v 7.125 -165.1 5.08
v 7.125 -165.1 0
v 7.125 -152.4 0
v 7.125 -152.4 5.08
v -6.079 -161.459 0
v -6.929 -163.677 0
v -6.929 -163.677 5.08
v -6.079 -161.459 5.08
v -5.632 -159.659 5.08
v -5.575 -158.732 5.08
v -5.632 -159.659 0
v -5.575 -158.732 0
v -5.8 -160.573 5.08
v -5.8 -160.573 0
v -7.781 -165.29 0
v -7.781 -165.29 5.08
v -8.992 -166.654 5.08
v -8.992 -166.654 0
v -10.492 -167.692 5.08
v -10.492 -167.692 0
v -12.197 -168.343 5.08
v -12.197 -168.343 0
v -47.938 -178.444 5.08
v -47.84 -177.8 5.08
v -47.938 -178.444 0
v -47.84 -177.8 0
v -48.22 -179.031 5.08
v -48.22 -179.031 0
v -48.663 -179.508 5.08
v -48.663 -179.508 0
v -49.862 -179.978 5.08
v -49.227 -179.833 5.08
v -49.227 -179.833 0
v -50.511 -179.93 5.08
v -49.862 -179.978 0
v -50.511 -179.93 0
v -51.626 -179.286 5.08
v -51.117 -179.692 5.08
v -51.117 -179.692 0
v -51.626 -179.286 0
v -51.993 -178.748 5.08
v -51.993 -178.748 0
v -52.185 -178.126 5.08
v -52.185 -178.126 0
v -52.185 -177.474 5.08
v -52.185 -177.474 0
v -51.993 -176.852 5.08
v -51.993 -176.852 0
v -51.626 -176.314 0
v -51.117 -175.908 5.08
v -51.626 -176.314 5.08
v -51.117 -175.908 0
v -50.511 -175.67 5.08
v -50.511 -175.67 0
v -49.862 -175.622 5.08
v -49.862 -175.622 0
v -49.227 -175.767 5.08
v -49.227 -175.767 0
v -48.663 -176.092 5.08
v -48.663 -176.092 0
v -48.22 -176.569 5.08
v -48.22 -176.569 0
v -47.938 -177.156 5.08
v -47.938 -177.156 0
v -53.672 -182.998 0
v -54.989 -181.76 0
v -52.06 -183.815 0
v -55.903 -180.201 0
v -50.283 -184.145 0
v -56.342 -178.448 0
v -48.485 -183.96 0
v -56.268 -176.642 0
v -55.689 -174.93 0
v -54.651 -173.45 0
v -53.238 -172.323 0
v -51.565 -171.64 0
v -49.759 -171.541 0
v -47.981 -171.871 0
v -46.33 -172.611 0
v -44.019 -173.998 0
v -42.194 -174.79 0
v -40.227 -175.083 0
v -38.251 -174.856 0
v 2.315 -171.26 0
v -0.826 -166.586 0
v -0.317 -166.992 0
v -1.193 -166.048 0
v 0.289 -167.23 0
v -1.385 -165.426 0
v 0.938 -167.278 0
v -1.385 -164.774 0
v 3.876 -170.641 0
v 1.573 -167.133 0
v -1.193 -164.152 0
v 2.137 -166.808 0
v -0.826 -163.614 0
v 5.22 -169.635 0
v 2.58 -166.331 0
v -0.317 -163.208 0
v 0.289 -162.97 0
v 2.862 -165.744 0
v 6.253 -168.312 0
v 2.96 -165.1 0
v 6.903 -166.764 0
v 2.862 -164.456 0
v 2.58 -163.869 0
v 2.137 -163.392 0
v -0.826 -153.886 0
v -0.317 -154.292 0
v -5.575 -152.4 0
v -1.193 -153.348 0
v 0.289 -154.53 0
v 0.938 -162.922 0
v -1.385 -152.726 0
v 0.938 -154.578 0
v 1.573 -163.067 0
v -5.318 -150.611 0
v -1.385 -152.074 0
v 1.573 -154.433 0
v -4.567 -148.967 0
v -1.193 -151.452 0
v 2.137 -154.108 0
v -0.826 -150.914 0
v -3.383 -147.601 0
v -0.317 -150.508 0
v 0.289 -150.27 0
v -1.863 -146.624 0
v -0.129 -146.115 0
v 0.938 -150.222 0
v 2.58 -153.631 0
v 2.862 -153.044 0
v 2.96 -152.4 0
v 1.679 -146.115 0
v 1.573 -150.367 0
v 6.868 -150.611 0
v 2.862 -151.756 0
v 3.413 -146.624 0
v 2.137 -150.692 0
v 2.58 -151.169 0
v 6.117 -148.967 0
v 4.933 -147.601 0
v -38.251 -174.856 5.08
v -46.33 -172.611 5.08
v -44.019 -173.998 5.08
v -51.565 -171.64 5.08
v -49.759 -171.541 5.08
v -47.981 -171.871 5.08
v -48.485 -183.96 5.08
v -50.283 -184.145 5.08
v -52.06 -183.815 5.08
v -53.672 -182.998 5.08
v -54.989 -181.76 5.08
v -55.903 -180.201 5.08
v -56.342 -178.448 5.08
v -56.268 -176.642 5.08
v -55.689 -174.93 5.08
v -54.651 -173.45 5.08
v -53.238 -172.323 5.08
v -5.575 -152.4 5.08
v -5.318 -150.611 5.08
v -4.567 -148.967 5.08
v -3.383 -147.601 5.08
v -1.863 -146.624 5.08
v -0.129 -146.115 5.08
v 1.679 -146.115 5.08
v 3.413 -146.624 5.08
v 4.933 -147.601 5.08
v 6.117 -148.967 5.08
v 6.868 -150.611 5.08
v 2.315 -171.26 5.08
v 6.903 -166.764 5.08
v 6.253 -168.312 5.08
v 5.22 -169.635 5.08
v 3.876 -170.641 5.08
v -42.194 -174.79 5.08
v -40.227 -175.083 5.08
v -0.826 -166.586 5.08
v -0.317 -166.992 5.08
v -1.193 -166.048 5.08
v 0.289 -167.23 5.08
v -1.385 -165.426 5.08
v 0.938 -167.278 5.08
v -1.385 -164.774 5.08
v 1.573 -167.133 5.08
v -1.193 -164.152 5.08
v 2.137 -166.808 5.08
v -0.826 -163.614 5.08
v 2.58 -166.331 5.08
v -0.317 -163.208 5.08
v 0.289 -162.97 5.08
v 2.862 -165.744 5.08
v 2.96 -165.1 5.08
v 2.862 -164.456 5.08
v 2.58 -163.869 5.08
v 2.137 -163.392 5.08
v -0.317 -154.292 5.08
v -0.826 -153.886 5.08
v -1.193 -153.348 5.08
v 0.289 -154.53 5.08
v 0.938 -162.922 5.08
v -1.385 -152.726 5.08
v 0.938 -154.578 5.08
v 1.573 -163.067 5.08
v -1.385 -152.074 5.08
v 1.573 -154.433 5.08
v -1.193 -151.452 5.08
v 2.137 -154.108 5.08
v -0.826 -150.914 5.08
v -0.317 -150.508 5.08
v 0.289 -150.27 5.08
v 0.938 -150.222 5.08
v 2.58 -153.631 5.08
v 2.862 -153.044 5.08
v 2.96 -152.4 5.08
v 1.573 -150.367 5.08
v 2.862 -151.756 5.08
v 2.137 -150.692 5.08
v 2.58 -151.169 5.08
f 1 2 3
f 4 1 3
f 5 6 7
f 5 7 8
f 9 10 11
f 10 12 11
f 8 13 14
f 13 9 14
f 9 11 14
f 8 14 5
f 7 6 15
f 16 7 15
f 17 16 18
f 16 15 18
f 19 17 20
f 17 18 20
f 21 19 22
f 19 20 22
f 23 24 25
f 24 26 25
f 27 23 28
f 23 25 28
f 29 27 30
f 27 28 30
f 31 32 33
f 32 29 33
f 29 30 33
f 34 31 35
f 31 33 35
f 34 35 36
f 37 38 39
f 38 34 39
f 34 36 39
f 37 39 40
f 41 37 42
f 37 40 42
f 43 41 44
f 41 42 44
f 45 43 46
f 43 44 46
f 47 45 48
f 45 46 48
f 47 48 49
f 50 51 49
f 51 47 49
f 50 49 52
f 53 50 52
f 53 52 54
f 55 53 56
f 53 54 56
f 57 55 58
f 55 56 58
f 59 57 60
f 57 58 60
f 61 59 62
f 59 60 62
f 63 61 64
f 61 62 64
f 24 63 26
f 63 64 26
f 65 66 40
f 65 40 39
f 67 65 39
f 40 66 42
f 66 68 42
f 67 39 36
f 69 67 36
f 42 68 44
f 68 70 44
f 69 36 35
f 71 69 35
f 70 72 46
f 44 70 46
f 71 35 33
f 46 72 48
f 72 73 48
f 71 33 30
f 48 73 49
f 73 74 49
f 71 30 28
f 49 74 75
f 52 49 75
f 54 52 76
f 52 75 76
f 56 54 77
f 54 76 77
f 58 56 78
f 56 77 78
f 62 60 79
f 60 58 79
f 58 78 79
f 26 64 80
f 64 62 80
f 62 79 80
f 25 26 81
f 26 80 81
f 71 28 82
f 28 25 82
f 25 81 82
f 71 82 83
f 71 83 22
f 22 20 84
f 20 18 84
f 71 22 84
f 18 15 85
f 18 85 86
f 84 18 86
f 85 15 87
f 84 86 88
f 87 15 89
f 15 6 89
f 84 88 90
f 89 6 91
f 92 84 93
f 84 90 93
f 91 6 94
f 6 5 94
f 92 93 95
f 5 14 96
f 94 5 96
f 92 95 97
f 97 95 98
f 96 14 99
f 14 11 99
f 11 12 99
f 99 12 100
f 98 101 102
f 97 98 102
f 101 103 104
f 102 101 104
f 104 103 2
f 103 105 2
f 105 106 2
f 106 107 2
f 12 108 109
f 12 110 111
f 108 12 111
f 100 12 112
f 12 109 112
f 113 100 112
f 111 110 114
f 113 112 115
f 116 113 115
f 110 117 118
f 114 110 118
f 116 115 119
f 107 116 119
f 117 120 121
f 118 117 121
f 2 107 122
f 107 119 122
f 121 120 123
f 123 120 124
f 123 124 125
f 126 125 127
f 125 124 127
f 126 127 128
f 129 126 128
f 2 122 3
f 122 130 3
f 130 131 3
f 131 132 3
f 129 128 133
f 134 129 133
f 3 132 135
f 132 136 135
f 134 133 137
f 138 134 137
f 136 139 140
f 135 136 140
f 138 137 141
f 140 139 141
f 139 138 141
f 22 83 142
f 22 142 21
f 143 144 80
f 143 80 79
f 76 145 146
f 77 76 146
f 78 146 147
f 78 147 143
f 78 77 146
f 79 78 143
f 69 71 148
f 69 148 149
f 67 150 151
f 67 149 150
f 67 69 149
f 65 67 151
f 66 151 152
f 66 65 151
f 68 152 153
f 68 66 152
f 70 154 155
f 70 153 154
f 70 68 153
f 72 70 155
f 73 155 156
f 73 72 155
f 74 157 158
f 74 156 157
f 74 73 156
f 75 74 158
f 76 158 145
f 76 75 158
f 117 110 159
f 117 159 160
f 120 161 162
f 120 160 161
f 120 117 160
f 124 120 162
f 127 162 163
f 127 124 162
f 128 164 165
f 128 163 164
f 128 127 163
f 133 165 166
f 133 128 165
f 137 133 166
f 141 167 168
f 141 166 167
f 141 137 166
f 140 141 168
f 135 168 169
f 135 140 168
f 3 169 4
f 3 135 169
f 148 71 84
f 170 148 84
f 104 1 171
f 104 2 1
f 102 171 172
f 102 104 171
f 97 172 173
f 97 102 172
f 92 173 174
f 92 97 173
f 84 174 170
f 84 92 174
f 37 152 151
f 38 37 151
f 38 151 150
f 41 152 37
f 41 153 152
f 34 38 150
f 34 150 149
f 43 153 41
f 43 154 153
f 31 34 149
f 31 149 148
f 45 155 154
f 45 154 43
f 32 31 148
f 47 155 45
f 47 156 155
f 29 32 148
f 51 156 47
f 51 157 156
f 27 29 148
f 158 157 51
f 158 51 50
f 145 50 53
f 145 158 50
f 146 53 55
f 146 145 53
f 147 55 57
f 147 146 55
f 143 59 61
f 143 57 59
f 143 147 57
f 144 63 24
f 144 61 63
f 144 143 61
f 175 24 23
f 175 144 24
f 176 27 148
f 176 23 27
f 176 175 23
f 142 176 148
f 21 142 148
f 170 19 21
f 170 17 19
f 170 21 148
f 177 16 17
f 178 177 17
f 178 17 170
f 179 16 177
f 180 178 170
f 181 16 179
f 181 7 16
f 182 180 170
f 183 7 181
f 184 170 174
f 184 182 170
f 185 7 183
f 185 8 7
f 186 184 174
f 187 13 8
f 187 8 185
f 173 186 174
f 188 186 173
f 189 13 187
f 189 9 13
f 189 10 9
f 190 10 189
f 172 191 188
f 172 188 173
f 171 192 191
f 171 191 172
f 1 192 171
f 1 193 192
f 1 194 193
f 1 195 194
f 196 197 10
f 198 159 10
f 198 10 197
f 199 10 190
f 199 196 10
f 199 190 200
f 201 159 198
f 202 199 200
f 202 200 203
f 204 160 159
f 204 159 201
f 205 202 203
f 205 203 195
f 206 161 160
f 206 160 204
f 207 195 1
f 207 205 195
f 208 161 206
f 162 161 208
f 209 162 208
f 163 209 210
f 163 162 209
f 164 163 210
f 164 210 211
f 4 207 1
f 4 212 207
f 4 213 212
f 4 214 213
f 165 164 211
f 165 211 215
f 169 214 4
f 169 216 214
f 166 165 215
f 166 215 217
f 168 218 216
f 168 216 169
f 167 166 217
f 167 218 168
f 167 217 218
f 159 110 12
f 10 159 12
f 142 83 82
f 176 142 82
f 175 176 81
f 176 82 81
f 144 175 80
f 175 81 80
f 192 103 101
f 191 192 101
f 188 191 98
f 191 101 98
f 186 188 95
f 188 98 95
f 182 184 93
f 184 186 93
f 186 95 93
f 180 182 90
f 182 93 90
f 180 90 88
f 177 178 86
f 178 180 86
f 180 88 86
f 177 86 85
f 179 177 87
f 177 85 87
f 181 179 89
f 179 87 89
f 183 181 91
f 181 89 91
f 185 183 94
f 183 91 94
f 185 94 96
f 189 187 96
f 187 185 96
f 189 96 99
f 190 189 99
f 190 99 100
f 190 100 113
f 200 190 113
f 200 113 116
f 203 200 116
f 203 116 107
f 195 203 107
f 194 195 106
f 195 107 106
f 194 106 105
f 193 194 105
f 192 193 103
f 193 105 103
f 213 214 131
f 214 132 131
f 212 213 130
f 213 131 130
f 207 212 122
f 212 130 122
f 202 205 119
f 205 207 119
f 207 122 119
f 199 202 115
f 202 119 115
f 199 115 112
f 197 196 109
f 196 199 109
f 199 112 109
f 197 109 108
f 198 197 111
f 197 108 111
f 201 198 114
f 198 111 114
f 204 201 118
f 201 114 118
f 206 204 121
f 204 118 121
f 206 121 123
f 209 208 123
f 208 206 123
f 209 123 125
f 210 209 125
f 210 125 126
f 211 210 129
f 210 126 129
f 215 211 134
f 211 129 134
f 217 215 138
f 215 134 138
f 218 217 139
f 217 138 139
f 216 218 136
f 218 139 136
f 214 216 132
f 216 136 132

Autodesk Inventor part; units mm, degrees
ref_plane "YZ Plane" through (0, 0, 0) normal (1, 0, 0) x (0, 1, 0)
ref_plane "XZ Plane" through (0, 0, 0) normal (0, 1, 0) x (-1, 0, 0)
ref_plane "XY Plane" through (0, 0, 0) normal (0, 0, 1) x (1, 0, 0)
sketch "Sketch2" plane through (0, 0, 0) normal (0, 0, 1) x (1, 0, 0)
  circle A0 centre (-50.0249, -177.8) radius 2.1844
  circle A1 centre (0.7751, -165.1) radius 2.1844
  circle A2 centre (0.7751, -152.4) radius 2.1844
  circle A3 centre (-50.0249, -152.4) radius 2.1844
  circle A4 centre (0.7751, -165.1) radius 6.35
  circle A5 centre (0.7751, -152.4) radius 6.35
  circle A6 centre (-50.0249, -177.8) radius 6.35
  line L0 (-5.5749, -131.829) -> (-5.5749, -160.1421)
  line L1 (-5.5749, -160.1421) -> (-51.565, -171.6396)
  line L2 (-50.6267, -184.4959) -> (7.1251, -170.0579)
  line L3 (7.1251, -170.0579) -> (7.1251, -148.3402)
  line L4 (-35.2436, -141.802) -> (-32.4116, -141.802)
  line L5 (-29.119, -141.802) -> (-26.287, -141.802)
  spline S0 degree 2 poles (-32.1725, -141.802) (-30.7653, -141.3711) (-29.3581, -141.802) knots 0 0 0 1 1 1 weights 1 1.034831 1
  spline S1 degree 3 poles (-18.0653, -168.2172) (-18.4536, -168.2172) (-18.8762, -168.1704) (-19.697, -167.9732) (-20.0954, -167.8231) (-20.8527, -167.4498) (-21.2719, -167.1795) (-22.0369, -166.5475) (-22.3831, -166.1864) (-22.9733, -165.4543) (-23.2675, -165.0121) (-23.7675, -164.0794) (-23.9738, -163.5891) (-24.3066, -162.6061) (-24.4533, -162.017) (-24.6377, -160.8215) (-24.6757, -160.2153) (-24.6621, -159.1128) (-24.6099, -158.5123) (-24.3986, -157.3309) (-24.2392, -156.75) (-23.8884, -155.7901) (-23.676, -155.3161) (-23.1679, -154.4164) (-22.8717, -153.9909) (-22.2831, -153.29) (-21.9408, -152.9459) (-21.1885, -152.3448) (-20.778, -152.0883) (-20.039, -151.7346) (-19.651, -151.5925) (-18.8526, -151.4059) (-18.4422, -151.3617) (-17.7112, -151.3617) (-17.3252, -151.4007) (-16.572, -151.5661) (-16.2047, -151.6923) (-15.5081, -152.0046) (-15.1205, -152.2298) (-14.403, -152.7599) (-14.0727, -153.0644) (-13.4595, -153.7287) (-13.1325, -154.1611) (-12.571, -155.0834) (-12.3359, -155.573) (-11.9434, -156.5769) (-11.7643, -157.1906) (-11.5273, -158.4416) (-11.469, -159.0789) (-11.4545, -160.2496) (-11.4978, -160.8932) (-11.7067, -162.1597) (-11.8725, -162.7825) (-12.2466, -163.8115) (-12.4761, -164.3187) (-13.0308, -165.2763) (-13.3566, -165.7263) (-13.9735, -166.4214) (-14.3085, -166.7415) (-15.0395, -167.2999) (-15.436, -167.5376) (-16.1507, -167.8676) (-16.528, -168.0009) (-17.3028, -168.1759) (-17.7004, -168.2172) (-18.0653, -168.2172) knots 0 0 0 0 0.1165 0.1165 0.232999 0.232999 0.369785 0.369785 0.506571 0.506571 0.651905 0.651905 0.797238 0.797238 0.963262 0.963262 1.129286 1.129286 1.294016 1.294016 1.458745 1.458745 1.600629 1.600629 1.742513 1.742513 1.875203 1.875203 2.007893 2.007893 2.120972 2.120972 2.234051 2.234051 2.340282 2.340282 2.446513 2.446513 2.569309 2.569309 2.692105 2.692105 2.84053 2.84053 2.988954 2.988954 3.163874 3.163874 3.338794 3.338794 3.515132 3.515132 3.69147 3.69147 3.843605 3.843605 3.99574 3.99574 4.122409 4.122409 4.249078 4.249078 4.358558 4.358558 4.468037 4.468037 4.468037 4.468037
  ellipse E0 centre (-18.0653, -159.6619) end of major axis (-18.0653, -154.3017) minor radius 4
  ellipse E1 centre (-18.0653, -159.6619) end of major axis (-18.0653, -161.1359) minor radius 1.1
  ellipse E2 centre (-18.0653, -127.6068) end of major axis (-18.0653, -163.5416) minor radius 12.1199 (-21.7061, -161.8819) -> (-21.3672, -162.1823) ccw
  ellipse E3 centre (-18.0653, -159.6619) end of major axis (-18.0653, -154.3017) minor radius 4 (-22.0428, -160.2294) -> (-21.7061, -161.8819) ccw
  ellipse E4 centre (-18.0653, -180.8584) end of major axis (-18.0653, -204.6203) minor radius 8.0143 (-21.8601, -159.929) -> (-22.0428, -160.2294) ccw
  line L6 (-21.8601, -159.929) -> (-20.5574, -159.929)
  ellipse E5 centre (-18.0653, -159.6619) end of major axis (-18.0653, -163.012) minor radius 2.5 (-15.5733, -159.929) -> (-20.5574, -159.929) ccw
  line L7 (-15.5733, -159.929) -> (-14.2705, -159.929)
  ellipse E6 centre (-18.0653, -180.8584) end of major axis (-18.0653, -204.6203) minor radius 8.0143 (-14.0878, -160.2294) -> (-14.2705, -159.929) ccw
  ellipse E7 centre (-18.0653, -159.6619) end of major axis (-18.0653, -154.3017) minor radius 4 (-14.4245, -161.8819) -> (-14.0878, -160.2294) ccw
  ellipse E8 centre (-18.0653, -127.6068) end of major axis (-18.0653, -163.5416) minor radius 12.1199 (-14.7634, -162.1823) -> (-14.4245, -161.8819) ccw
  line L8 (-14.7634, -162.1823) -> (-16.4184, -162.1823)
  ellipse E9 centre (-18.0653, -159.6619) end of major axis (-18.0653, -163.012) minor radius 2.5 (-19.7122, -162.1823) -> (-16.4184, -162.1823) ccw
  line L9 (-19.7122, -162.1823) -> (-21.3672, -162.1823)
  ellipse E10 centre (-18.0653, -159.6619) end of major axis (-18.0653, -158.3218) minor radius 1
  line L10 (-41.3127, -175.622) -> (-8.3483, -167.3809)
  line L11 (-8.3483, -167.3809) -> (-5.5749, -160.1421)
  line L12 (-41.3127, -175.622) -> (-49.0132, -171.0017)
  point P0 (0, 0)
  point P1 (-48.4848, -183.9604)
  point P2 (2.3152, -171.2604)
  point P3 (7.1251, -165.1)
  point P4 (7.1251, -152.4)
  point P5 (-5.5749, -152.4)
  dimension "d6" = 12.7
  dimension "d9" = 135
  dimension "d10" = 125
extrude "Extrusion2" add sketch "Sketch2" along normal blind 5.08 contours A4 | A4 A5 L3 | A4 L2 A6 L12 L10 L11 L0 A5 | A5 | A6 | L1 L12 A6
fillet "Fillet1" radius 7.62 4 edges at (-49.0132, -171.0017, 2.54) (-41.3127, -175.622, 2.54) (-8.3483, -167.3809, 2.54) (-5.5749, -160.1421, 2.54)
properties part number "back_funnel"
